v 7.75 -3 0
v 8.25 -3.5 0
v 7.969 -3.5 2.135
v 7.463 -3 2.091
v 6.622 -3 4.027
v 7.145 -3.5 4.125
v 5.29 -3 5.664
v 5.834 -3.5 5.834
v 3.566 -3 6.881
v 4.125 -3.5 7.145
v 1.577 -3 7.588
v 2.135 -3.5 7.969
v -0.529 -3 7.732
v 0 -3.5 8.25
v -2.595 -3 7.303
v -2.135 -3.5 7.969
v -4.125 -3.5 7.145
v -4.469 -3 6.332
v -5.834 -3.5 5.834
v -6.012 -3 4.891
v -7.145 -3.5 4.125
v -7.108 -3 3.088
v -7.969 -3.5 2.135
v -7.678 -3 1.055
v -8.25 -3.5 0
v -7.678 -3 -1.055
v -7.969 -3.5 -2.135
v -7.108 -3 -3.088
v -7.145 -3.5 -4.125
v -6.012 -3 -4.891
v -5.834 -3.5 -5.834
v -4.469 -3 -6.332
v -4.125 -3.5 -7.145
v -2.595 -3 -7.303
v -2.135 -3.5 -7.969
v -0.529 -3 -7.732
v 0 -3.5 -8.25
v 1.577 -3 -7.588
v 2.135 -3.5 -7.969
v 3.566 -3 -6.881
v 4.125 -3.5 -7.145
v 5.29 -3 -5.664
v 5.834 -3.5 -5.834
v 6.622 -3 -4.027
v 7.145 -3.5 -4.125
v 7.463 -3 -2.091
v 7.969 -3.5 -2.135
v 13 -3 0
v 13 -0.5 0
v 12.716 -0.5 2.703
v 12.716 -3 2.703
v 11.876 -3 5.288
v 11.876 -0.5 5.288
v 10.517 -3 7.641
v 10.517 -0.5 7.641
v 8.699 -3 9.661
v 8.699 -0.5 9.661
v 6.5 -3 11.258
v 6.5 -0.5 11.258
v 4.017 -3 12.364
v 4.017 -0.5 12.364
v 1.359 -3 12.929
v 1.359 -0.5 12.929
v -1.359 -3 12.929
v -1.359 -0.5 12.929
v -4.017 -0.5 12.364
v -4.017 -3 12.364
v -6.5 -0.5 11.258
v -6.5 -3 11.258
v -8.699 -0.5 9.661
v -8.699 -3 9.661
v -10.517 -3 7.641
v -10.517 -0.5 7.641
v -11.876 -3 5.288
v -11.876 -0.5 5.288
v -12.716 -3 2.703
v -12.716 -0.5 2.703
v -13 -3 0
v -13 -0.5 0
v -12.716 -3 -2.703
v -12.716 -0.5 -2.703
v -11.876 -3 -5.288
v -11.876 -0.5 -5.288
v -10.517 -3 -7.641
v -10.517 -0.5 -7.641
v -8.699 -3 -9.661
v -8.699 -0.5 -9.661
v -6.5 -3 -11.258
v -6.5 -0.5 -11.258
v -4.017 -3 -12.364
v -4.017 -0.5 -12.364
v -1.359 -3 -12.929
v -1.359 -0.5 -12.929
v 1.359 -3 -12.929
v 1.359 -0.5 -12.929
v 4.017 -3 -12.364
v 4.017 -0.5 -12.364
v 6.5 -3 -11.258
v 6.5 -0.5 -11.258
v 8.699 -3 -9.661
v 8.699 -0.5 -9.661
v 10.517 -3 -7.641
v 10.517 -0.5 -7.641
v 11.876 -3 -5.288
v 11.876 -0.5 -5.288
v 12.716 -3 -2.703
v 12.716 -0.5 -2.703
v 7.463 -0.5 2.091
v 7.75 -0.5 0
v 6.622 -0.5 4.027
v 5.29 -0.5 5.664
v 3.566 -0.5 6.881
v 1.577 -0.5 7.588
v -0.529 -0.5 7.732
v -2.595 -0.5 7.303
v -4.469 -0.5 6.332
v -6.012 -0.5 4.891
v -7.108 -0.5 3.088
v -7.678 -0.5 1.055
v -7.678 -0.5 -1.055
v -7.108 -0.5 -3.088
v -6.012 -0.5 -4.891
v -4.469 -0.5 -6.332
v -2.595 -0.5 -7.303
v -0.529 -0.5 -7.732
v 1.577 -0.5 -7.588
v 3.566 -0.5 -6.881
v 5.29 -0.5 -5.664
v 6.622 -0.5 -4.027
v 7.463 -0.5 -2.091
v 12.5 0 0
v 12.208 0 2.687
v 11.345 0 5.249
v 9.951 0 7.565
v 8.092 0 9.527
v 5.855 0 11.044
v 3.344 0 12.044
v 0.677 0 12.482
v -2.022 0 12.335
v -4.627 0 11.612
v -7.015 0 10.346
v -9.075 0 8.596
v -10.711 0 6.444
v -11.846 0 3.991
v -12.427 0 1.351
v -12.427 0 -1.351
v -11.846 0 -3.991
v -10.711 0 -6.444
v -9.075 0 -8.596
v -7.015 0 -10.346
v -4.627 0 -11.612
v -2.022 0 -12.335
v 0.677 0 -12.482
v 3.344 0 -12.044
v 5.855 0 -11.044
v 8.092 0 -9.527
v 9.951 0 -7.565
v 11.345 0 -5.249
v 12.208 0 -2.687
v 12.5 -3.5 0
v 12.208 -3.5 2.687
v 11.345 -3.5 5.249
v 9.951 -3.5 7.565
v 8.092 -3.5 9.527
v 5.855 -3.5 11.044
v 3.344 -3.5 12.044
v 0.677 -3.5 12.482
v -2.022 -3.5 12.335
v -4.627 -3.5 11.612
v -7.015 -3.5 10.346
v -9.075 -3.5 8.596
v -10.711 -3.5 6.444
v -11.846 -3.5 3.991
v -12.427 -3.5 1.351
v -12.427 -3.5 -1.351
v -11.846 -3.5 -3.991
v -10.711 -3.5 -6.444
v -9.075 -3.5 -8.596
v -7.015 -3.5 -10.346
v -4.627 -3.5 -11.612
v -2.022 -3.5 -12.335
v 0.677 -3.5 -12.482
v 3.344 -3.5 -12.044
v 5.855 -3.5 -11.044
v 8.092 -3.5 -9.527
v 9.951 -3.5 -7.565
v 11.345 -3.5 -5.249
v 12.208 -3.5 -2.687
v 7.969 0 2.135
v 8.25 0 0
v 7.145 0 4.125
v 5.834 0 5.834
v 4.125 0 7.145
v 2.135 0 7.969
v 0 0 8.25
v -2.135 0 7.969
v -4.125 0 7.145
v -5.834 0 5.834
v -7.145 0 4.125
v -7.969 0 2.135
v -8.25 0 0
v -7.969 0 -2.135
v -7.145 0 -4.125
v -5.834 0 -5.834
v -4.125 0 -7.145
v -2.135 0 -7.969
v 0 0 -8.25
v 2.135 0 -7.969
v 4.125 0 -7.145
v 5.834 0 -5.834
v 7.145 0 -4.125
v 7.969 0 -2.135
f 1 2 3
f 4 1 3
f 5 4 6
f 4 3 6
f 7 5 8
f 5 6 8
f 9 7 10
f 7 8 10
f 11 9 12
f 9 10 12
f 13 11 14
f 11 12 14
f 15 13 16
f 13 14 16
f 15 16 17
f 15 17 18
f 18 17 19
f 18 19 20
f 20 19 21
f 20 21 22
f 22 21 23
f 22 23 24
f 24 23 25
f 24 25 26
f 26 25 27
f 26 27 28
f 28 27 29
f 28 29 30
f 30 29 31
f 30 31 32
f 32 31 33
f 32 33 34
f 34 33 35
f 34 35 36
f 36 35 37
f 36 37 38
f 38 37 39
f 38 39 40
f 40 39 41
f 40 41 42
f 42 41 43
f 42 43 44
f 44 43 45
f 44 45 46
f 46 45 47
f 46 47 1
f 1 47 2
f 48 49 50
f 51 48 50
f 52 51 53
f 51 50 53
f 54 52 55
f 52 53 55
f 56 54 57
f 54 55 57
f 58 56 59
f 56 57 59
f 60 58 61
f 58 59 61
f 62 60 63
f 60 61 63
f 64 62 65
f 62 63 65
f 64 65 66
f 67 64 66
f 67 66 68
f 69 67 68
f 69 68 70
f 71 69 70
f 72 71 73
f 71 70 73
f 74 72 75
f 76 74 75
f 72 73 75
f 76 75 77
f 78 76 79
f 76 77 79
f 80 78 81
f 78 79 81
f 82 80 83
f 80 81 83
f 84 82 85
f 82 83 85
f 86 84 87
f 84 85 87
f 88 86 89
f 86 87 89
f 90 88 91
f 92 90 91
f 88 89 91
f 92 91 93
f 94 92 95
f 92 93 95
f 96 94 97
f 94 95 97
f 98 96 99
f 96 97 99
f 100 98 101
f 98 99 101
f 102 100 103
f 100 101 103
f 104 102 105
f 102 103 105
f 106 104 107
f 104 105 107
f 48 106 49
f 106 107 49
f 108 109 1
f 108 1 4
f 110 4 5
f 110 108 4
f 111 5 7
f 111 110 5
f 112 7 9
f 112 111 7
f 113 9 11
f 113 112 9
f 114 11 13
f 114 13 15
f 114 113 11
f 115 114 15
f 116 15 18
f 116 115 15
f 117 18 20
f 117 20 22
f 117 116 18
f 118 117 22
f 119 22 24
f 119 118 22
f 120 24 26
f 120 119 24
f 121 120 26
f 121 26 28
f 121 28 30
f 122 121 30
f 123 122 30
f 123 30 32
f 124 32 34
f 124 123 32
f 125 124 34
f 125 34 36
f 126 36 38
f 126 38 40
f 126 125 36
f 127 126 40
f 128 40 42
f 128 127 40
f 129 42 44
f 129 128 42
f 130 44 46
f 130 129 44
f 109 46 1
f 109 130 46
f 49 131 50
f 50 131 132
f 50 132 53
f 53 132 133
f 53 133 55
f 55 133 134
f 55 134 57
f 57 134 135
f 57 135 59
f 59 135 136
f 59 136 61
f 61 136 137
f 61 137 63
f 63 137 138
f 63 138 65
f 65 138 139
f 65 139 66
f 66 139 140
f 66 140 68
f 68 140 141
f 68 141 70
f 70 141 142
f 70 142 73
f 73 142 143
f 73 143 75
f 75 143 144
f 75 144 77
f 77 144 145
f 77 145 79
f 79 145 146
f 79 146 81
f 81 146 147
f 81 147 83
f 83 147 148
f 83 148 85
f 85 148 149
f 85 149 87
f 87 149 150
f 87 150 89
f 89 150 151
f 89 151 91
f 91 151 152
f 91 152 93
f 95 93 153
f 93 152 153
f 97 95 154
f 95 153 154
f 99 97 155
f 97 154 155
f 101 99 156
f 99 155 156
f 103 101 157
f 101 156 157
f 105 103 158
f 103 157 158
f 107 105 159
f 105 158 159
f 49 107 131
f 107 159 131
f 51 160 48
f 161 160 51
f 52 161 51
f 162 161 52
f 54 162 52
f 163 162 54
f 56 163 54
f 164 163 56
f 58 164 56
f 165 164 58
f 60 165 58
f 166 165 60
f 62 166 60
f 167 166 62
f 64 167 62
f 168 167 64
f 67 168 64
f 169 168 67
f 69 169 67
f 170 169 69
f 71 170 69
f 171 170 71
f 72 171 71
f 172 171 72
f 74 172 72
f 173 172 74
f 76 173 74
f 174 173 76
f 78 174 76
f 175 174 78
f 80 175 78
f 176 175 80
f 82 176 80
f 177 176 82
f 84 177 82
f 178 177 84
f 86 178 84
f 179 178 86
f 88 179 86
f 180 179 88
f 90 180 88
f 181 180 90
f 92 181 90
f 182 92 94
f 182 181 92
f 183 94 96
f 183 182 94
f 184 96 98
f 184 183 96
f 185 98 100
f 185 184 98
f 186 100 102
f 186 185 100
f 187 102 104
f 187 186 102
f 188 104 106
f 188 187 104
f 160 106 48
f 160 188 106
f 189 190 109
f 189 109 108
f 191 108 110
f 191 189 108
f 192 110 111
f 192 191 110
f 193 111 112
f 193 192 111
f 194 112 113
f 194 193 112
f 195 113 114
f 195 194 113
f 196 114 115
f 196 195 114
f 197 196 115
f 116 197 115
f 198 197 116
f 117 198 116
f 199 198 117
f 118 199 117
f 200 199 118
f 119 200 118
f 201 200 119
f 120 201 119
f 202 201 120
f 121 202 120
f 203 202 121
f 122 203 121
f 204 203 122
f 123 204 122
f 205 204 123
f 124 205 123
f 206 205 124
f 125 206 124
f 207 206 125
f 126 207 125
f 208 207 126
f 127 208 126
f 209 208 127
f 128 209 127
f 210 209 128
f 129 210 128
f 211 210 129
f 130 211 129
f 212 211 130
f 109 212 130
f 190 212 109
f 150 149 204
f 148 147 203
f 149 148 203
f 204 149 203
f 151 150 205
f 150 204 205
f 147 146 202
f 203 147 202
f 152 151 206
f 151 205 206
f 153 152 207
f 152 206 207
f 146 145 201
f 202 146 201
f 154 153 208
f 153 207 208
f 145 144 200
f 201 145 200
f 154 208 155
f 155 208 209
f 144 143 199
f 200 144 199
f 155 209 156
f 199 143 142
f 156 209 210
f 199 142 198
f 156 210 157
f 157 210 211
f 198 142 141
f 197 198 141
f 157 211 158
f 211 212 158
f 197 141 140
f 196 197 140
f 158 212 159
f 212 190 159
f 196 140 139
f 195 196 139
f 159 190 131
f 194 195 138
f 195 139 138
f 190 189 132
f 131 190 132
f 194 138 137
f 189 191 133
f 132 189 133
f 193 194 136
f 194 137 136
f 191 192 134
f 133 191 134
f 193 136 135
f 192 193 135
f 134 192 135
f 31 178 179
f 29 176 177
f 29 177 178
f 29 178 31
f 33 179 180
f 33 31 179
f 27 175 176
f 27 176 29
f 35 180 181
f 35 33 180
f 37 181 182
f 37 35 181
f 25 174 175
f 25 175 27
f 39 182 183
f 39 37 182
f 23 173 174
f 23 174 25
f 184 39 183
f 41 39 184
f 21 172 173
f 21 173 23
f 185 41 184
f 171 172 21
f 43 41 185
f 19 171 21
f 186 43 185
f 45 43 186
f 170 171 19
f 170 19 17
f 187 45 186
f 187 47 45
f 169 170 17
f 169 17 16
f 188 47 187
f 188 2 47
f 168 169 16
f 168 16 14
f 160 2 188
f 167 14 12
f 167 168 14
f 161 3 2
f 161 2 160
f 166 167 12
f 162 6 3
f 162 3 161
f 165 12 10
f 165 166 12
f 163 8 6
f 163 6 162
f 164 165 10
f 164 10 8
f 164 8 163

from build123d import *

# Parameters (mm, degrees)
F0_R     = 13
F0_R_2   = 7.75
F1_DEPTH = 3.5
F2_SIZE2 = 0.5
F2_SIZE  = 0.5


with BuildPart() as f1:
    # F0 (on Front) → F1 (new body)
    with BuildSketch(Plane.XZ):
        Circle(F0_R)
        Circle(F0_R_2, mode=Mode.SUBTRACT)
    extrude(amount=F1_DEPTH)

    # F2
    f2_edges = [f1.edges().sort_by_distance(p)[0] for p in [
        (-13, -3.5, 0),
        (-7.75, -3.5, 0),
        (-13, 0, 0),
        (-7.75, 0, 0),
    ]]
    chamfer(f2_edges, length=F2_SIZE, length2=F2_SIZE2)


solid = f1.part
